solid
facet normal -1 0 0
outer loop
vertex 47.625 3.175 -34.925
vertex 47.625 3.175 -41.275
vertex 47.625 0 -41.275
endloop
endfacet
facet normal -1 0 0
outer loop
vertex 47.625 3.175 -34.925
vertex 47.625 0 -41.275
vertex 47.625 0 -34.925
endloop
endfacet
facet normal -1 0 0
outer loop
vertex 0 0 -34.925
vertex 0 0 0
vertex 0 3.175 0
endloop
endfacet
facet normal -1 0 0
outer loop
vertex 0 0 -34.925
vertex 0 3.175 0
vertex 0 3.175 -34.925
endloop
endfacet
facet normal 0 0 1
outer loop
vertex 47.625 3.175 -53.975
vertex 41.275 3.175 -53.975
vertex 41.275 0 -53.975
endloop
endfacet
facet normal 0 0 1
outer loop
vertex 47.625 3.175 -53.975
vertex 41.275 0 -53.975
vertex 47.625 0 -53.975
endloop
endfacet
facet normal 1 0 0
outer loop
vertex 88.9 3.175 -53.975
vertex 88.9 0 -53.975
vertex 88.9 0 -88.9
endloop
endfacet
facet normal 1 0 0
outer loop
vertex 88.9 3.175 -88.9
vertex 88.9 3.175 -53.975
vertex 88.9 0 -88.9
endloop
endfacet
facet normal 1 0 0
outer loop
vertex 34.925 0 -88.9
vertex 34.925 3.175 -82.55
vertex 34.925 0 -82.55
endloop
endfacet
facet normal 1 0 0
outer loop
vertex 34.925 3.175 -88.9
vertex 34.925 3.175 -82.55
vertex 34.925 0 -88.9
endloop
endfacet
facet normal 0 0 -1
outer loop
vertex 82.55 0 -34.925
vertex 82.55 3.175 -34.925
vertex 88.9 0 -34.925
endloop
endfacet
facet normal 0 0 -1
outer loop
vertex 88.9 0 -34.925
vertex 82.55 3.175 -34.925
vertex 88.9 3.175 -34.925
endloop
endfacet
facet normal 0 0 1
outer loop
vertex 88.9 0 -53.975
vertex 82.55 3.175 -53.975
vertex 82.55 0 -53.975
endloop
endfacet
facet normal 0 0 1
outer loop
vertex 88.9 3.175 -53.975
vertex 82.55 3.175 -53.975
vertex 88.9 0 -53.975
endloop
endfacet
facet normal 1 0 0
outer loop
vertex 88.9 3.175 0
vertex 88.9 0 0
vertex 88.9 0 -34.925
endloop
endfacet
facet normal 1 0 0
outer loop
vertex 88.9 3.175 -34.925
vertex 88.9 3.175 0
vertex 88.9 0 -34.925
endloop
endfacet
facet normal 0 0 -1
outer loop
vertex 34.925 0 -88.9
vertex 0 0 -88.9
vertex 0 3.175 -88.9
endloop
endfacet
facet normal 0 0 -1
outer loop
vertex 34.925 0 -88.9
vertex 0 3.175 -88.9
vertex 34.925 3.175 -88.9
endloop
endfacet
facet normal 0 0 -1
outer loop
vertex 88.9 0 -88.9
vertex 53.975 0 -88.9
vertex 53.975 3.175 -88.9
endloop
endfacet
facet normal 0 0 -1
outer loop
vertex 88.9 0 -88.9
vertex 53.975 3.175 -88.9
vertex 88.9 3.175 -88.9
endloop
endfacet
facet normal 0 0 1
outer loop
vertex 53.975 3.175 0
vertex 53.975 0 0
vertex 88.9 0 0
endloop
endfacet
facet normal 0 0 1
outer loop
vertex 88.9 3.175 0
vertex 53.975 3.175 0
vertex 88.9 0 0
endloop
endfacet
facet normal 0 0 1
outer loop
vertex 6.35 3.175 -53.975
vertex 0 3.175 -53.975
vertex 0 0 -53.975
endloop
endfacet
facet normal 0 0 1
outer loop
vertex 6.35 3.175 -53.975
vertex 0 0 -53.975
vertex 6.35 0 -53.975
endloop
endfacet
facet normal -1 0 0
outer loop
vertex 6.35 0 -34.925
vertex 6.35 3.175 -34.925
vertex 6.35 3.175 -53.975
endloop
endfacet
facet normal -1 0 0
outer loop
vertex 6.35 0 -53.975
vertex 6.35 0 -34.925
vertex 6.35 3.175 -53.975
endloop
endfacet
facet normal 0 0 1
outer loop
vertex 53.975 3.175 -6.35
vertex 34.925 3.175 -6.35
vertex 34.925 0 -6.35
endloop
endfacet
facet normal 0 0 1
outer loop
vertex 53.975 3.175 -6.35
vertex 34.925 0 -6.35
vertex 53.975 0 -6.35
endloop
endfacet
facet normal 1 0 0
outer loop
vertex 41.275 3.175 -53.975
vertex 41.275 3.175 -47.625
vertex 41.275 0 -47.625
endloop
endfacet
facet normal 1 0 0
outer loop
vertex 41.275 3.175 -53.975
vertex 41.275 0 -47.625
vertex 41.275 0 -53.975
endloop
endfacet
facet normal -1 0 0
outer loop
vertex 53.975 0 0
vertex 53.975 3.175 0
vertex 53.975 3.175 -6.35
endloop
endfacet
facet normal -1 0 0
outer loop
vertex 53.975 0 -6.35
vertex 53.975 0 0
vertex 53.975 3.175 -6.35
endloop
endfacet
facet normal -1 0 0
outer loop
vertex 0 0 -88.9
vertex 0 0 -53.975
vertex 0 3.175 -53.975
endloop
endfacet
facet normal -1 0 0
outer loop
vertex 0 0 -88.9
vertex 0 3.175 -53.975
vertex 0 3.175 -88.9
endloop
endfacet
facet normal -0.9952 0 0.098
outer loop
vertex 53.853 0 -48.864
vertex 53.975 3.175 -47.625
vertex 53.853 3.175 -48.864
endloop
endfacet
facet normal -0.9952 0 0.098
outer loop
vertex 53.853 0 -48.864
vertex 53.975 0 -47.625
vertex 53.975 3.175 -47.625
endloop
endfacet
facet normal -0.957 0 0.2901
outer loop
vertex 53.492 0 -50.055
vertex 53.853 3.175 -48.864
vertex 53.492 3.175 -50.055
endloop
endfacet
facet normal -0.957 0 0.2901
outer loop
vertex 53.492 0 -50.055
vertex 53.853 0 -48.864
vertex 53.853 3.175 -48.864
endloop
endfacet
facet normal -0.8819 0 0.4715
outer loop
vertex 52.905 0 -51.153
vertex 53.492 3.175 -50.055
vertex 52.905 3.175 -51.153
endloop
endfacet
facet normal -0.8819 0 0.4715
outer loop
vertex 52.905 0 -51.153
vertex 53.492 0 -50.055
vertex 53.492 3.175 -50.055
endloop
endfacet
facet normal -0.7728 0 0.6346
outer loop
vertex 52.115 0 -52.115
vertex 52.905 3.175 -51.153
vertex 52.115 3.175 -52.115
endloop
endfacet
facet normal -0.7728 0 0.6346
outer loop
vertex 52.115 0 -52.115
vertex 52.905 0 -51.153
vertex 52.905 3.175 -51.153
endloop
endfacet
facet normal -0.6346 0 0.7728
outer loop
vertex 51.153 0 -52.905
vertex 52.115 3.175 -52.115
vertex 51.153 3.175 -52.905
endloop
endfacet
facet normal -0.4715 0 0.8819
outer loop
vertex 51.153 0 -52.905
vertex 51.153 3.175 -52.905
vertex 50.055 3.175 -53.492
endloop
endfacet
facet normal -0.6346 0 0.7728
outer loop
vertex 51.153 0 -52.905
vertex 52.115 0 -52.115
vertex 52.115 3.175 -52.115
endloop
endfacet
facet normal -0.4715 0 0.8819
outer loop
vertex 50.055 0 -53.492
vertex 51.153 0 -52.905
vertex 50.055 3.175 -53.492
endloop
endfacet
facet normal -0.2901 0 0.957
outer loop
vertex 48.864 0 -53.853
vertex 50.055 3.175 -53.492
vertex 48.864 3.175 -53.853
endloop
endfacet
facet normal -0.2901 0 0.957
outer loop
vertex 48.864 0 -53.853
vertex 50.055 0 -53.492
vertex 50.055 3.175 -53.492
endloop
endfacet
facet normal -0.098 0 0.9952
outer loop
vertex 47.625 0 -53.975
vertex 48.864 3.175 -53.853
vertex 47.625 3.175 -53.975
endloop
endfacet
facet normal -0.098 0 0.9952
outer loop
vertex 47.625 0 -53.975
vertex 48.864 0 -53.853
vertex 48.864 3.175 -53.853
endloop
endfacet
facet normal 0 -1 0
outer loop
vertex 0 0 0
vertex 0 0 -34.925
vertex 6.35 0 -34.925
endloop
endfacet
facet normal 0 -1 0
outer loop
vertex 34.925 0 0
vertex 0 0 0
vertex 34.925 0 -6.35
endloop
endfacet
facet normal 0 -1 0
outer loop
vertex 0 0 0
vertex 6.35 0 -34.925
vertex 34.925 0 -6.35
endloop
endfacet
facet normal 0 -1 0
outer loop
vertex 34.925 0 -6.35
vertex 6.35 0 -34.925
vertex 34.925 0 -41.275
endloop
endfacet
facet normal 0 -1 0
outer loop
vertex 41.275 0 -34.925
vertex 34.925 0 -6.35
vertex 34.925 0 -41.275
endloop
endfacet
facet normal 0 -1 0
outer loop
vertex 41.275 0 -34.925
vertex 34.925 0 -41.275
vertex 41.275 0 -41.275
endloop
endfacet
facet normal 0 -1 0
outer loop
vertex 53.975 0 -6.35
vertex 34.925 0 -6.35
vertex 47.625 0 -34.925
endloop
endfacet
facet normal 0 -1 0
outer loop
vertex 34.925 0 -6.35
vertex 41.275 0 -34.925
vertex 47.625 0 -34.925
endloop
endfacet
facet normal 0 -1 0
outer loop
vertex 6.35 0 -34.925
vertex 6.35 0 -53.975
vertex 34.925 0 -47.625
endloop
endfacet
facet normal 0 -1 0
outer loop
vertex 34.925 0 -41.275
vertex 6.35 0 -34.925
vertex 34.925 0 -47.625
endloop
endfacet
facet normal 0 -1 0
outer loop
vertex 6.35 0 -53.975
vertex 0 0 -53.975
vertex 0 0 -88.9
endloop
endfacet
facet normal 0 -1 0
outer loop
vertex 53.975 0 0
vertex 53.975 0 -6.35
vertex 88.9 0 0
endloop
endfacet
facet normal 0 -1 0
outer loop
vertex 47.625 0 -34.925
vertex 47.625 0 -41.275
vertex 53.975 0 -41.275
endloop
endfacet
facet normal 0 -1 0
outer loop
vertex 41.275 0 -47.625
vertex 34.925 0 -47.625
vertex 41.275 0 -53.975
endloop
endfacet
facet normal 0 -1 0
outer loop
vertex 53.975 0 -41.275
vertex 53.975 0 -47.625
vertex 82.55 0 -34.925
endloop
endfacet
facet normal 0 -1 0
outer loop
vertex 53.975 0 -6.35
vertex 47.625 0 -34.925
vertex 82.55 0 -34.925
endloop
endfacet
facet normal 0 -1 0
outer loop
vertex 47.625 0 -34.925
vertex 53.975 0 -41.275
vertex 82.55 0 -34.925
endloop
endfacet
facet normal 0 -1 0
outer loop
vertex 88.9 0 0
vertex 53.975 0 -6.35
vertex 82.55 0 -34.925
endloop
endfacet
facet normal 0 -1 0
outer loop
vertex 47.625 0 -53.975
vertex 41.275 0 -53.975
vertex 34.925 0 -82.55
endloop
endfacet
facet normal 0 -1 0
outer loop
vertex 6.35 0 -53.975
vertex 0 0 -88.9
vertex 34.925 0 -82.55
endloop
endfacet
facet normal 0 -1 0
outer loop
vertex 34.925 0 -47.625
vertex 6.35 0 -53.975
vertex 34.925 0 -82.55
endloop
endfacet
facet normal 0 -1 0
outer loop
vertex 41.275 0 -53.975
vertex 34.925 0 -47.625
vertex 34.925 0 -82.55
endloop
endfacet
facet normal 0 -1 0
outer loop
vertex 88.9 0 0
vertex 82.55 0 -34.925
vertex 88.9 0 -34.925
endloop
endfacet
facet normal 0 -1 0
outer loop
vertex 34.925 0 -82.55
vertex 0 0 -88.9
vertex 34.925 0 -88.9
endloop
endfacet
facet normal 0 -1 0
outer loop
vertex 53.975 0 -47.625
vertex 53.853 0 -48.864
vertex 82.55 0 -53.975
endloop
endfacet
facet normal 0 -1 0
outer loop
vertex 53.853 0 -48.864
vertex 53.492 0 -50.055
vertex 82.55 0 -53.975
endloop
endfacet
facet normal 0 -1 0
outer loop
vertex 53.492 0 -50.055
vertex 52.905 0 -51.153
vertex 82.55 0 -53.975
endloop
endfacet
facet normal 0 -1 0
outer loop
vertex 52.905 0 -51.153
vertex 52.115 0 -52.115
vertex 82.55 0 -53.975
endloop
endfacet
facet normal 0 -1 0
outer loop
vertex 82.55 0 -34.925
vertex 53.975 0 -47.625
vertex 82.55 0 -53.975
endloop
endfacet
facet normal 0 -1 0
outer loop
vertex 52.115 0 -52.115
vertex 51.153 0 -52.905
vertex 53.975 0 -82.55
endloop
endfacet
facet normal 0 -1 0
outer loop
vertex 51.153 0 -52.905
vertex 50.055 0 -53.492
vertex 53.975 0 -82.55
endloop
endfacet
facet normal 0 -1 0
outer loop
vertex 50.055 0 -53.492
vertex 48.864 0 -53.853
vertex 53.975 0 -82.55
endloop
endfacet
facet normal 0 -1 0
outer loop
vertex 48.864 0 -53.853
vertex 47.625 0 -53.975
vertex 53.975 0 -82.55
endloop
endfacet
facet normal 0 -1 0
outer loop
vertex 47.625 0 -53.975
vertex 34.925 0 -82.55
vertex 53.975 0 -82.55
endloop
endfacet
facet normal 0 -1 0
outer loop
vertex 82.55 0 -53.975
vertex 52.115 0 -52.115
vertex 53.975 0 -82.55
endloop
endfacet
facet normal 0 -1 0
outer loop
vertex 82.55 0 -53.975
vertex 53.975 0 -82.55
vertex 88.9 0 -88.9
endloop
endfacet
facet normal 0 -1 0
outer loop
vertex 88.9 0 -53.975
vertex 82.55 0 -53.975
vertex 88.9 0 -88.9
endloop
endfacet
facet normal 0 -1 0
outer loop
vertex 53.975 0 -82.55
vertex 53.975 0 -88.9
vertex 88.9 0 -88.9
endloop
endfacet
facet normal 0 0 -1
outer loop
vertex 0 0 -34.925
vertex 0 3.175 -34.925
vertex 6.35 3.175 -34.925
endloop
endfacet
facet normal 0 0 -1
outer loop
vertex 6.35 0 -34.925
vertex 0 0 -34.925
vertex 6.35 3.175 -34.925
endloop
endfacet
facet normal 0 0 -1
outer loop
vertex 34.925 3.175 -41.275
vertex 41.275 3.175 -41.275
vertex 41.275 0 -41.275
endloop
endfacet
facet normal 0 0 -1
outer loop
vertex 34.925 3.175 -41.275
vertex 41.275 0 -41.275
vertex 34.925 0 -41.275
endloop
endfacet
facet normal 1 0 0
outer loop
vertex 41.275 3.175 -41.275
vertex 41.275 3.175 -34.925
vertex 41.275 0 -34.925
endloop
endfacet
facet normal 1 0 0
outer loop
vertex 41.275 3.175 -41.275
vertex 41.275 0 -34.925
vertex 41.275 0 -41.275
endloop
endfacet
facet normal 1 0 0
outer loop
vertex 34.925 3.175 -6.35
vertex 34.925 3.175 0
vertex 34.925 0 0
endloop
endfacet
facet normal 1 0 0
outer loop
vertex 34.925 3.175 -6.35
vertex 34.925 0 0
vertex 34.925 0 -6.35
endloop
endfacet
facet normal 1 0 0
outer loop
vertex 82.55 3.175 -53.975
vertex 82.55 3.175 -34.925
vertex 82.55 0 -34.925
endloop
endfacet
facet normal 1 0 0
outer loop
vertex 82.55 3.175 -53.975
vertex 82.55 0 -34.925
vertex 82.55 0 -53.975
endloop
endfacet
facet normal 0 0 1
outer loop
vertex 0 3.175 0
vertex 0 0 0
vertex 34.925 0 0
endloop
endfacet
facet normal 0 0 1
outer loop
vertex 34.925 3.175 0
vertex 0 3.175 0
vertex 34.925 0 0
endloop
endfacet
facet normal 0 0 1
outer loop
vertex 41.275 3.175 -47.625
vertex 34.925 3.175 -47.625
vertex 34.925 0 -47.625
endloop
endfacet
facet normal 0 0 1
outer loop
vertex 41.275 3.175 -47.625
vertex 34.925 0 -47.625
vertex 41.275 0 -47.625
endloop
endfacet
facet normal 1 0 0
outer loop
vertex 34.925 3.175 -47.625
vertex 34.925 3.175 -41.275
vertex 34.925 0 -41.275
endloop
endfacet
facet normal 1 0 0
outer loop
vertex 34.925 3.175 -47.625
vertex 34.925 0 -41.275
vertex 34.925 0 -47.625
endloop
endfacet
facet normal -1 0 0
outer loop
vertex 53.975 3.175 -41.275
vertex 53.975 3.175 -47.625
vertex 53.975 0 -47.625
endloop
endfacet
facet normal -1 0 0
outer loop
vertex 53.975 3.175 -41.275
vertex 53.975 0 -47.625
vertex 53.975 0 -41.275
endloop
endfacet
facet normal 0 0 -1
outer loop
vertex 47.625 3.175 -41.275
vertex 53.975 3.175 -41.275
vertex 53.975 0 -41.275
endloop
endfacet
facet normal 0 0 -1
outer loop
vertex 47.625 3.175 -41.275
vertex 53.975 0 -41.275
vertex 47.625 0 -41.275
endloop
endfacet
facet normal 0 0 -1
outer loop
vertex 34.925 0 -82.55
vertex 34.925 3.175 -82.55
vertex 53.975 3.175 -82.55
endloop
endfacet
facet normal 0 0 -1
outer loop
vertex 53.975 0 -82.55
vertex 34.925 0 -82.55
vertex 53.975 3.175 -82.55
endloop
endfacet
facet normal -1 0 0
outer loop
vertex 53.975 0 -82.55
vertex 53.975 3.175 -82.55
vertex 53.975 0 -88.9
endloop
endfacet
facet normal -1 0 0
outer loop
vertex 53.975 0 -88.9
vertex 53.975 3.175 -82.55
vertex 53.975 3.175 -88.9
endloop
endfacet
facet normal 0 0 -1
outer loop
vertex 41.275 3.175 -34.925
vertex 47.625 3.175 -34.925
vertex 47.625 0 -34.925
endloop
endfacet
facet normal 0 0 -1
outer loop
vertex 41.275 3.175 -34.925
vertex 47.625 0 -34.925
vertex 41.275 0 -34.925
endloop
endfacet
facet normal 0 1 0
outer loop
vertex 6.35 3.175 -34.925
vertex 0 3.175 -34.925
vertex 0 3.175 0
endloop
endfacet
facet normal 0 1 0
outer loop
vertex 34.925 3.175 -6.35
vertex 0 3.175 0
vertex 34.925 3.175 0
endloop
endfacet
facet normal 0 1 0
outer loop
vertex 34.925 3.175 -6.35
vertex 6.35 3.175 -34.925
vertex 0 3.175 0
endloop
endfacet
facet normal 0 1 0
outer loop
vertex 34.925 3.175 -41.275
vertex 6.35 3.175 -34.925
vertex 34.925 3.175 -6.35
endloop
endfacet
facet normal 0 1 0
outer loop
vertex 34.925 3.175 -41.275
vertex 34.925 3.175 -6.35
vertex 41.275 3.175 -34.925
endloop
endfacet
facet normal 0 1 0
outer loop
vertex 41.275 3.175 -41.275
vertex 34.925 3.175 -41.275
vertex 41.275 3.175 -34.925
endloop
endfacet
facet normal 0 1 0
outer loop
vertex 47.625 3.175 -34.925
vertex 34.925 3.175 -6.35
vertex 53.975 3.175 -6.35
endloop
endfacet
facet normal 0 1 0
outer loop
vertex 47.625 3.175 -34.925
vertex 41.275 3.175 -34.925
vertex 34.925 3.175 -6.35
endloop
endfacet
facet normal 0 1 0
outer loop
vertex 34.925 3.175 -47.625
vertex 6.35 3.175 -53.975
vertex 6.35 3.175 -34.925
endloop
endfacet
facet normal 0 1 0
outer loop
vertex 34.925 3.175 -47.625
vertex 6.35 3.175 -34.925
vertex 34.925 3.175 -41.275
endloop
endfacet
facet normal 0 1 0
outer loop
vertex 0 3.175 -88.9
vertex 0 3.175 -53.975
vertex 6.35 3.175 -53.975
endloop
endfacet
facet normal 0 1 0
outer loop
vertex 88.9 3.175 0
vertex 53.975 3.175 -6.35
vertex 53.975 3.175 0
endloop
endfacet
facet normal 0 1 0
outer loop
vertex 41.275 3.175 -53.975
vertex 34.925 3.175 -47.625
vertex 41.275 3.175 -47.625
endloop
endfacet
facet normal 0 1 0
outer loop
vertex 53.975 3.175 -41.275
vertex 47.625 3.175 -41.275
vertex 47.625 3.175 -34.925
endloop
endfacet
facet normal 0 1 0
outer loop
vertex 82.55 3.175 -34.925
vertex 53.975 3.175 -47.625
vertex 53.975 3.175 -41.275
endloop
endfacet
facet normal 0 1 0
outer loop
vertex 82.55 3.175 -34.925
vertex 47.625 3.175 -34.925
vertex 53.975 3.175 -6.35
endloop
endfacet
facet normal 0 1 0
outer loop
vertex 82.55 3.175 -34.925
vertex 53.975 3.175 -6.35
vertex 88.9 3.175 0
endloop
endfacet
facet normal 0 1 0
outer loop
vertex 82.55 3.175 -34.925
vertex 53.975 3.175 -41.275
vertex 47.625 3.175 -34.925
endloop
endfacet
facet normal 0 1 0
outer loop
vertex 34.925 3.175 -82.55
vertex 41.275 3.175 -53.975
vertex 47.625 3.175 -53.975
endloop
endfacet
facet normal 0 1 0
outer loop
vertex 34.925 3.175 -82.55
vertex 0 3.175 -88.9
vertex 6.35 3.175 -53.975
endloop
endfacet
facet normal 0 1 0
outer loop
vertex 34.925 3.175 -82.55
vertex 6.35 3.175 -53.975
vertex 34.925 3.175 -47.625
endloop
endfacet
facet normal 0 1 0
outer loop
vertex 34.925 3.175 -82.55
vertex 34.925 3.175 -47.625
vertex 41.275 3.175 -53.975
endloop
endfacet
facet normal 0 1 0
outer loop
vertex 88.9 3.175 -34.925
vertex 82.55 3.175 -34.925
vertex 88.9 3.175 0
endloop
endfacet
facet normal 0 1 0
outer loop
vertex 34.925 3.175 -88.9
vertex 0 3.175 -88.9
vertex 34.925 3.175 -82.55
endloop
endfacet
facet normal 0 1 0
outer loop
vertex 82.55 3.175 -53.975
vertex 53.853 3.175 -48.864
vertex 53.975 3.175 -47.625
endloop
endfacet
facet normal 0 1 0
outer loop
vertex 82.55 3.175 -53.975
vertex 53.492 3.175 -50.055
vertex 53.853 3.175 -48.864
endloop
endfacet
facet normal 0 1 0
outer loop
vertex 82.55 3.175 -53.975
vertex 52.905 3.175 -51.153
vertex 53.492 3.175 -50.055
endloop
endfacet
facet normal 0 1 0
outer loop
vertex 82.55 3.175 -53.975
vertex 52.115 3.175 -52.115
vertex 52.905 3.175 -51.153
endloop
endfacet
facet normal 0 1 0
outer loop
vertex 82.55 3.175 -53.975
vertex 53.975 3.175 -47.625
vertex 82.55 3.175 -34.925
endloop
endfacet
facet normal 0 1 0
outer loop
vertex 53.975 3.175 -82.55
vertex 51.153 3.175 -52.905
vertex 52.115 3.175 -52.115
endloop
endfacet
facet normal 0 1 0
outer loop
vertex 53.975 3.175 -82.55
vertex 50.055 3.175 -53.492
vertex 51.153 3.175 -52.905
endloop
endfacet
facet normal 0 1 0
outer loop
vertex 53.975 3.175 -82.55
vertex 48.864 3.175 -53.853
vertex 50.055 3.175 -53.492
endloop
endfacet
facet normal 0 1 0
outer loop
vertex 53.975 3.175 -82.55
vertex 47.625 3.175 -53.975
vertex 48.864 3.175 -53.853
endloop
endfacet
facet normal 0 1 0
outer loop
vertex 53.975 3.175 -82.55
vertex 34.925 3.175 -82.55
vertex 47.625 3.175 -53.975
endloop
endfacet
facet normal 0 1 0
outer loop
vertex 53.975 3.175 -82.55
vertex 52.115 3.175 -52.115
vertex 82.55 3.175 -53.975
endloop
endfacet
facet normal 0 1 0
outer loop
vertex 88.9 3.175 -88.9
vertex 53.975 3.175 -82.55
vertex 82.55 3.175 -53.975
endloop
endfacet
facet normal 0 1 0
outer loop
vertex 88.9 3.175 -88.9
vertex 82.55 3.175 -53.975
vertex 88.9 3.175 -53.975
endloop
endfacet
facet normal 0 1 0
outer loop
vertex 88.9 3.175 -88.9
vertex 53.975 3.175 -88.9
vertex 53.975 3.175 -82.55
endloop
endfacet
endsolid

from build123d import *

# Parameters (mm, degrees)
SKETCH1_W           = 88.9
SKETCH1_H           = 88.9
BOSS_EXTRUDE1_DEPTH = 3.175
CUT_EXTRUDE3_DEPTH  = 3.175
SKETCH4_W           = 19.05
SKETCH4_H           = 6.35
SKETCH4_W_2         = 6.35
SKETCH4_H_2         = 19.05
CUT_EXTRUDE2_DEPTH  = 3.175
SKETCH7_W           = 6.35
SKETCH7_H           = 6.35
CUT_EXTRUDE4_DEPTH  = 126.763669734
FILLET1_R           = 6.35


with BuildPart() as part:
    # Sketch1 → Boss-Extrude1 (new body)
    with BuildSketch(Plane(origin=(0, 0, 0), x_dir=(1, 0, 0), z_dir=(0, 1, 0))):
        with Locations((44.45, 44.45)):
            Rectangle(SKETCH1_W, SKETCH1_H)
    extrude(amount=BOSS_EXTRUDE1_DEPTH)

    # Sketch5 → Cut-Extrude3 (cut)
    with BuildSketch(Plane(origin=(0, 3.175, 0), x_dir=(1, 0, 0), z_dir=(0, 1, 0))):
        Polygon((41.275, 47.625), (41.275, 53.975), (47.625, 53.975), (47.625, 47.625), (53.975, 47.625), (53.975, 41.275), (47.625, 41.275), (47.625, 34.925), (41.275, 34.925), (41.275, 41.275), (34.925, 41.275), (34.925, 47.625), align=None)
    extrude(amount=-CUT_EXTRUDE3_DEPTH, mode=Mode.SUBTRACT)

    # Sketch4 → Cut-Extrude2 (cut)
    with BuildSketch(Plane(origin=(0, 3.175, 0), x_dir=(1, 0, 0), z_dir=(0, 1, 0))):
        with Locations((44.45, 85.725)):
            Rectangle(SKETCH4_W, SKETCH4_H)
        with Locations((85.725, 44.45)):
            Rectangle(SKETCH4_W_2, SKETCH4_H_2)
        with Locations((44.45, 3.175)):
            Rectangle(SKETCH4_W, SKETCH4_H)
        with Locations((3.175, 44.45)):
            Rectangle(SKETCH4_W_2, SKETCH4_H_2)
    extrude(amount=-CUT_EXTRUDE2_DEPTH, mode=Mode.SUBTRACT)

    # Sketch7 → Cut-Extrude4 (cut, through all)
    with BuildSketch(Plane(origin=(0, 3.175, 0), x_dir=(1, 0, 0), z_dir=(0, 1, 0))):
        with Locations((50.8, 50.8)):
            Rectangle(SKETCH7_W, SKETCH7_H)
    extrude(amount=-CUT_EXTRUDE4_DEPTH, mode=Mode.SUBTRACT)

    # Fillet1
    fillet1_edges = [part.edges().sort_by_distance(p)[0] for p in [
        (53.975, 1.5875, -53.975),
    ]]
    fillet(fillet1_edges, radius=FILLET1_R)


solid = part.part
